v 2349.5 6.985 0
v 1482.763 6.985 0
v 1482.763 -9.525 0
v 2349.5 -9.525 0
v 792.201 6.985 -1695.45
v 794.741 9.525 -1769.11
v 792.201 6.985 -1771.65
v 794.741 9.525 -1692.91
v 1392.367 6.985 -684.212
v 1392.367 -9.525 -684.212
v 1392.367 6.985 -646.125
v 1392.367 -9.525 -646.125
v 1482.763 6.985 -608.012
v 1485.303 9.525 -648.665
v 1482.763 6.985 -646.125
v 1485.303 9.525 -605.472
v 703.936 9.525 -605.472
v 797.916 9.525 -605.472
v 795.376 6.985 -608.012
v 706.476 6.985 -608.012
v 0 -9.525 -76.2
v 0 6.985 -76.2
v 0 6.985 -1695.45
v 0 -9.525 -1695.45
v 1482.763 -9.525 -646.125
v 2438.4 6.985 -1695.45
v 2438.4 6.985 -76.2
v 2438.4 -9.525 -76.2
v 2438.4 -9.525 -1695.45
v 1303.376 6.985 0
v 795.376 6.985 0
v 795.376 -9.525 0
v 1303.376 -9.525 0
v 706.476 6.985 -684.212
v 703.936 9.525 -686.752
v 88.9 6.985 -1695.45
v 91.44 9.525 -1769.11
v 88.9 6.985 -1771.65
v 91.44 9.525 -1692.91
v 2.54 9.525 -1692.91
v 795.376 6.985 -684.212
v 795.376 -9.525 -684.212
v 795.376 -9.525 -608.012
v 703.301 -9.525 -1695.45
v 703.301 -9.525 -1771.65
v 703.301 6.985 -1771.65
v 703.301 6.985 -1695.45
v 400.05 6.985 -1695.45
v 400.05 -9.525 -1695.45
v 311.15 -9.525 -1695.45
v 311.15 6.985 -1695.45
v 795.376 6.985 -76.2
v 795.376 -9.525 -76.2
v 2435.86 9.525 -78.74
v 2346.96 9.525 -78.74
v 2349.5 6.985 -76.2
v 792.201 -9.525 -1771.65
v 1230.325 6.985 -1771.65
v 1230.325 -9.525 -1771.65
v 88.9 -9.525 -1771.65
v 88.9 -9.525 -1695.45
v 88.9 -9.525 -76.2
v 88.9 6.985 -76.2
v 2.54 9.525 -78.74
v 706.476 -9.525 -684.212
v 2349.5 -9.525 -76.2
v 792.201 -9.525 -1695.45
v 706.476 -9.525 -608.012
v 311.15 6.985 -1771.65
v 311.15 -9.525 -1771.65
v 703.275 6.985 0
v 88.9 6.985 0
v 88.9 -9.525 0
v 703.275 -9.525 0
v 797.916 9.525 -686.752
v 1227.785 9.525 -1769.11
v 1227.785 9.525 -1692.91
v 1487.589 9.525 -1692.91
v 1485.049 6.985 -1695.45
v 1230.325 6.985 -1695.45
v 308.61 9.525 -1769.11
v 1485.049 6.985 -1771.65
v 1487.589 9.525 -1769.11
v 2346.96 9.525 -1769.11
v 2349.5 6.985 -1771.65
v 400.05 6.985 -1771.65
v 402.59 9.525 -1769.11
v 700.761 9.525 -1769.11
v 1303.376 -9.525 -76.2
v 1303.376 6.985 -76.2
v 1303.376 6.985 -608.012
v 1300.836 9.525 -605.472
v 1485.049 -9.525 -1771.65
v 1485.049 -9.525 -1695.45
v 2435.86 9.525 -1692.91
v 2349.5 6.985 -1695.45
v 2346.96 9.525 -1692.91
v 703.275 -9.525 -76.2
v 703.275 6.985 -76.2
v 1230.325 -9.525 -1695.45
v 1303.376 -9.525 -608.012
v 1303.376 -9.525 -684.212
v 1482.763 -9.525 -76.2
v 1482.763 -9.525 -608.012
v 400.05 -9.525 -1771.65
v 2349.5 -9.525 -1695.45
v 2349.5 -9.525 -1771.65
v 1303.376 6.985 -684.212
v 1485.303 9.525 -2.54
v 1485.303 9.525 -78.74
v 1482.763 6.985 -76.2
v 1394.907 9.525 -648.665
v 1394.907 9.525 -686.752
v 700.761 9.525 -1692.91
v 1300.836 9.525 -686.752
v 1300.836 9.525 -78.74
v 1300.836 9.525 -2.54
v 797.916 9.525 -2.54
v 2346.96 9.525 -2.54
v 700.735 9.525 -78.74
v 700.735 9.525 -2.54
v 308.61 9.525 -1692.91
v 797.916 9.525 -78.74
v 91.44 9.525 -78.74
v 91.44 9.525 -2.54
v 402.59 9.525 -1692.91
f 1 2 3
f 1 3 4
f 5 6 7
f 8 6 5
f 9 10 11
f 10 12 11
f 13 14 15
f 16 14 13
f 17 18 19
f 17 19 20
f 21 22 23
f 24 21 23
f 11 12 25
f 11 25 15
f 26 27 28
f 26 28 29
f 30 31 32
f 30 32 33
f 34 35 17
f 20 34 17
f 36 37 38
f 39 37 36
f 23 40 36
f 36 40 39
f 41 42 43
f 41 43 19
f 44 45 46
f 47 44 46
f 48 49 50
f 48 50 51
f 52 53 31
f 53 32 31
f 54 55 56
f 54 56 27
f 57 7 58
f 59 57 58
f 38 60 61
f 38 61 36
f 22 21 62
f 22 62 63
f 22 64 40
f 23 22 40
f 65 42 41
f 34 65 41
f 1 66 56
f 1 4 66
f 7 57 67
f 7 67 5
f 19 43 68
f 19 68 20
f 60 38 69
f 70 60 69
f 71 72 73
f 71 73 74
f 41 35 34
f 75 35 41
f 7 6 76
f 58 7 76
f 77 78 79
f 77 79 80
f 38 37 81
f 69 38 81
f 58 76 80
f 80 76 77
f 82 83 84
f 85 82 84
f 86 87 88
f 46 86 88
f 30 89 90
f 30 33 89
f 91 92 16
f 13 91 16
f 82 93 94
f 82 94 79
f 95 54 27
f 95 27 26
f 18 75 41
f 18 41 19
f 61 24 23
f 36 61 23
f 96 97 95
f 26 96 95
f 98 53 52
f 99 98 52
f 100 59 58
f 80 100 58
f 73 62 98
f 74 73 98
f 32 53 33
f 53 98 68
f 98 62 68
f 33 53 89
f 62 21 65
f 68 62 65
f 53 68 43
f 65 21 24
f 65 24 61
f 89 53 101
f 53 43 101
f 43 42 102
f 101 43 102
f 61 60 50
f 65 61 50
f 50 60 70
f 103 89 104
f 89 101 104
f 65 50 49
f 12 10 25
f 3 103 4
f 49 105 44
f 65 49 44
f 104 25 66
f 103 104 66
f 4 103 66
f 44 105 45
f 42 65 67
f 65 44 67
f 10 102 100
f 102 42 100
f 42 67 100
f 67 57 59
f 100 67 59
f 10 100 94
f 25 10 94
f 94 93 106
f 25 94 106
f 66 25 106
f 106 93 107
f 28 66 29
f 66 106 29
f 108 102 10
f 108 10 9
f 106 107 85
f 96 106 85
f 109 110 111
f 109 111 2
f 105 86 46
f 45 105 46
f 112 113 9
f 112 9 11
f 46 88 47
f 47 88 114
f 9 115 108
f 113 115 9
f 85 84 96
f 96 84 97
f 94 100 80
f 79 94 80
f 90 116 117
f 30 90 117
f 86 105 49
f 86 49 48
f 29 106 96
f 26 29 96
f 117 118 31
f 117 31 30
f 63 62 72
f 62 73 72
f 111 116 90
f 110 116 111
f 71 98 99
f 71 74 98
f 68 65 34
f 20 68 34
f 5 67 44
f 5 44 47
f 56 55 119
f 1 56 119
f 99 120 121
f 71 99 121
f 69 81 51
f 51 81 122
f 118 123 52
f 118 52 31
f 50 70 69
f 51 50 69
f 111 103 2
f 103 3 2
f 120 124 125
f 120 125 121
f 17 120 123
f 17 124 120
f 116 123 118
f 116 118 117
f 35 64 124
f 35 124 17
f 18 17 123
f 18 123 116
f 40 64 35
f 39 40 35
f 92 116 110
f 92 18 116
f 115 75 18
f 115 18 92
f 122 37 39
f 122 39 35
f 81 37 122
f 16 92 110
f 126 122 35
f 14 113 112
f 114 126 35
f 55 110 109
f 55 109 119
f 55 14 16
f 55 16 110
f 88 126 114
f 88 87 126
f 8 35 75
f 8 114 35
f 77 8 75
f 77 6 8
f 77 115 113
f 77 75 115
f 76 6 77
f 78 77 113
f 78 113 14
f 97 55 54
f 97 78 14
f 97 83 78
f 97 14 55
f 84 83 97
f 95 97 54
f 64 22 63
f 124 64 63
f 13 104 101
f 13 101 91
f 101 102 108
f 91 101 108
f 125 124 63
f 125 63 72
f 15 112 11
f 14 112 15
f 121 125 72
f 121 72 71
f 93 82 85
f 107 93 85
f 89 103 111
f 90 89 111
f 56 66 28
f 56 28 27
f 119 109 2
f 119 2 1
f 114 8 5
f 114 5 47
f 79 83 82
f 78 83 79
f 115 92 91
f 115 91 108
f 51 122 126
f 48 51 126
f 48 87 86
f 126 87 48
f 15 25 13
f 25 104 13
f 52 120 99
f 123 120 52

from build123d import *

# Parameters (mm, degrees)
SKETCH1_W                 = 2438.4
SKETCH1_H                 = 1771.65
BOSS_EXTRUDE1_DEPTH       = 9.525
CUT_EXTRUDE2_START        = 1303.3756
CUT_EXTRUDE2_OUTLINE_W    = 19.05
CUT_EXTRUDE2_OUTLINE_H    = 76.2
CUT_EXTRUDE2_OUTLINE_H_2  = 38.1127
CUT_EXTRUDE2_DEPTH        = 179.3875
CUT_EXTRUDE2_START_2      = 706.4756
CUT_EXTRUDE2_2_OUTLINE_W  = 19.05
CUT_EXTRUDE2_2_OUTLINE_H  = 76.2
CUT_EXTRUDE2_2_DEPTH      = 85.725
CUT_EXTRUDE2_3_OUTLINE_W  = 19.05
CUT_EXTRUDE2_3_OUTLINE_H  = 76.2
CUT_EXTRUDE2_3_DEPTH      = 88.9
CUT_EXTRUDE2_START_3      = 2349.5
CUT_EXTRUDE2_4_OUTLINE_W  = 19.05
CUT_EXTRUDE2_4_OUTLINE_H  = 76.2
CUT_EXTRUDE2_4_DEPTH      = 88.9
CUT_EXTRUDE2_START_4      = 311.15
CUT_EXTRUDE2_5_OUTLINE_W  = 19.05
CUT_EXTRUDE2_5_OUTLINE_H  = 76.2
CUT_EXTRUDE2_5_DEPTH      = 88.9
CUT_EXTRUDE2_START_5      = 1230.3252
CUT_EXTRUDE2_6_OUTLINE_W  = 19.05
CUT_EXTRUDE2_6_OUTLINE_H  = 76.2
CUT_EXTRUDE2_6_DEPTH      = 254.7239
CUT_EXTRUDE2_7_OUTLINE_W  = 19.05
CUT_EXTRUDE2_7_OUTLINE_H  = 38.0873
CUT_EXTRUDE2_7_DEPTH      = 88.991565563
CUT_EXTRUDE2_START_6      = 703.2752
CUT_EXTRUDE2_8_OUTLINE_W  = 19.05
CUT_EXTRUDE2_8_OUTLINE_H  = 76.2
CUT_EXTRUDE2_8_DEPTH      = 92.1004
CUT_EXTRUDE2_START_7      = 703.3006
CUT_EXTRUDE2_9_OUTLINE_W  = 19.05
CUT_EXTRUDE2_9_OUTLINE_H  = 76.2
CUT_EXTRUDE2_9_DEPTH      = 3.175
CUT_EXTRUDE2_START_8      = 792.2006
CUT_EXTRUDE2_10_OUTLINE_W = 19.05
CUT_EXTRUDE2_10_OUTLINE_H = 76.2
CUT_EXTRUDE2_10_DEPTH     = 3.175
CHAMFER1_SIZE             = 2.54


# Read off the part's stored shape, not the designer's step: Cut-Extrude2
with BuildPart() as part:
    # Sketch1 → Boss-Extrude1 (new, symmetric)
    with BuildSketch(Plane(origin=(0, 0, 0), x_dir=(1, 0, 0), z_dir=(0, 1, 0))):
        with Locations((1219.2, 885.825)):
            Rectangle(SKETCH1_W, SKETCH1_H)
    extrude(amount=BOSS_EXTRUDE1_DEPTH, both=True)

    # Cut-Extrude2 outline → Cut-Extrude2 (cut)
    with BuildSketch(Plane.YZ.offset(CUT_EXTRUDE2_START)):
        with Locations((0, -1733.55)):
            Rectangle(CUT_EXTRUDE2_OUTLINE_W, CUT_EXTRUDE2_OUTLINE_H)
        with Locations((0, -627.068849999)):
            Rectangle(CUT_EXTRUDE2_OUTLINE_W, CUT_EXTRUDE2_OUTLINE_H_2)
        with Locations((0, -38.1)):
            Rectangle(CUT_EXTRUDE2_OUTLINE_W, CUT_EXTRUDE2_OUTLINE_H)
    extrude(amount=CUT_EXTRUDE2_DEPTH, mode=Mode.SUBTRACT)

    # Cut-Extrude2 2 outline → Cut-Extrude2 2 (cut)
    with BuildSketch(Plane.YZ.offset(CUT_EXTRUDE2_START_2)):
        with Locations((0, -1733.55)):
            Rectangle(CUT_EXTRUDE2_2_OUTLINE_W, CUT_EXTRUDE2_2_OUTLINE_H)
        with Locations((0, -646.112499999)):
            Rectangle(CUT_EXTRUDE2_2_OUTLINE_W, CUT_EXTRUDE2_2_OUTLINE_H)
        with Locations((0, -38.1)):
            Rectangle(CUT_EXTRUDE2_2_OUTLINE_W, CUT_EXTRUDE2_2_OUTLINE_H)
    extrude(amount=CUT_EXTRUDE2_2_DEPTH, mode=Mode.SUBTRACT)

    # Cut-Extrude2 3 outline → Cut-Extrude2 3 (cut)
    with BuildSketch(Plane.YZ):
        with Locations((0, -1733.55)):
            Rectangle(CUT_EXTRUDE2_3_OUTLINE_W, CUT_EXTRUDE2_3_OUTLINE_H)
        with Locations((0, -38.1)):
            Rectangle(CUT_EXTRUDE2_3_OUTLINE_W, CUT_EXTRUDE2_3_OUTLINE_H)
    extrude(amount=CUT_EXTRUDE2_3_DEPTH, mode=Mode.SUBTRACT)

    # Cut-Extrude2 4 outline → Cut-Extrude2 4 (cut)
    with BuildSketch(Plane.YZ.offset(CUT_EXTRUDE2_START_3)):
        with Locations((0, -1733.55)):
            Rectangle(CUT_EXTRUDE2_4_OUTLINE_W, CUT_EXTRUDE2_4_OUTLINE_H)
        with Locations((0, -38.1)):
            Rectangle(CUT_EXTRUDE2_4_OUTLINE_W, CUT_EXTRUDE2_4_OUTLINE_H)
    extrude(amount=CUT_EXTRUDE2_4_DEPTH, mode=Mode.SUBTRACT)

    # Cut-Extrude2 5 outline → Cut-Extrude2 5 (cut)
    with BuildSketch(Plane.YZ.offset(CUT_EXTRUDE2_START_4)):
        with Locations((0, -1733.55)):
            Rectangle(CUT_EXTRUDE2_5_OUTLINE_W, CUT_EXTRUDE2_5_OUTLINE_H)
    extrude(amount=CUT_EXTRUDE2_5_DEPTH, mode=Mode.SUBTRACT)

    # Cut-Extrude2 6 outline → Cut-Extrude2 6 (cut)
    with BuildSketch(Plane.YZ.offset(CUT_EXTRUDE2_START_5)):
        with Locations((0, -1733.55)):
            Rectangle(CUT_EXTRUDE2_6_OUTLINE_W, CUT_EXTRUDE2_6_OUTLINE_H)
    extrude(amount=CUT_EXTRUDE2_6_DEPTH, mode=Mode.SUBTRACT)

    # Cut-Extrude2 7 outline → Cut-Extrude2 7 (cut)
    with BuildSketch(Plane.YZ.offset(CUT_EXTRUDE2_START)):
        with Locations((0, -665.168849999)):
            Rectangle(CUT_EXTRUDE2_7_OUTLINE_W, CUT_EXTRUDE2_7_OUTLINE_H)
    extrude(amount=CUT_EXTRUDE2_7_DEPTH, mode=Mode.SUBTRACT)

    # Cut-Extrude2 8 outline → Cut-Extrude2 8 (cut)
    with BuildSketch(Plane.YZ.offset(CUT_EXTRUDE2_START_6)):
        with Locations((0, -38.1)):
            Rectangle(CUT_EXTRUDE2_8_OUTLINE_W, CUT_EXTRUDE2_8_OUTLINE_H)
    extrude(amount=CUT_EXTRUDE2_8_DEPTH, mode=Mode.SUBTRACT)

    # Cut-Extrude2 9 outline → Cut-Extrude2 9 (cut)
    with BuildSketch(Plane.YZ.offset(CUT_EXTRUDE2_START_7)):
        with Locations((0, -1733.55)):
            Rectangle(CUT_EXTRUDE2_9_OUTLINE_W, CUT_EXTRUDE2_9_OUTLINE_H)
    extrude(amount=CUT_EXTRUDE2_9_DEPTH, mode=Mode.SUBTRACT)

    # Cut-Extrude2 10 outline → Cut-Extrude2 10 (cut)
    with BuildSketch(Plane.YZ.offset(CUT_EXTRUDE2_START_8)):
        with Locations((0, -646.112499999)):
            Rectangle(CUT_EXTRUDE2_10_OUTLINE_W, CUT_EXTRUDE2_10_OUTLINE_H)
    extrude(amount=CUT_EXTRUDE2_10_DEPTH, mode=Mode.SUBTRACT)

    # Chamfer1
    chamfer1_edges = [part.edges().sort_by_distance(p)[0] for p in [
        (1303.3756, 9.525, -646.112499999),
        (1393.06935, 9.525, -608.012499999),
        (1482.7631, 9.525, -627.068849999),
        (1437.565132782, 9.525, -646.125199999),
        (1392.367165563, 9.525, -665.168849999),
        (1347.871382781, 9.525, -684.212499999),
        (88.9, 9.525, -38.1),
        (44.45, 9.525, -76.2),
        (795.3756, 9.525, -38.1),
        (749.3254, 9.525, -76.2),
        (703.2752, 9.525, -38.1),
        (1482.7631, 9.525, -38.1),
        (1393.06935, 9.525, -76.2),
        (1303.3756, 9.525, -38.1),
        (2393.95, 9.525, -76.2),
        (2349.5, 9.525, -38.1),
        (44.45, 9.525, -1695.45),
        (88.9, 9.525, -1733.55),
        (0, 9.525, -885.825),
        (396.0876, 9.525, 0),
        (1049.3756, 9.525, 0),
        (1916.13155, 9.525, 0),
        (2438.4, 9.525, -885.825),
        (1917.27455, 9.525, -1771.65),
        (1011.2629, 9.525, -1771.65),
        (551.6753, 9.525, -1771.65),
        (200.025, 9.525, -1771.65),
        (311.15, 9.525, -1733.55),
        (355.6, 9.525, -1695.45),
        (400.05, 9.525, -1733.55),
        (703.3006, 9.525, -1733.55),
        (747.7506, 9.525, -1695.45),
        (792.2006, 9.525, -1733.55),
        (1230.3252, 9.525, -1733.55),
        (1357.68715, 9.525, -1695.45),
        (1485.0491, 9.525, -1733.55),
        (2349.5, 9.525, -1733.55),
        (2393.95, 9.525, -1695.45),
        (706.4756, 9.525, -646.112499999),
        (750.9256, 9.525, -608.012499999),
        (795.3756, 9.525, -646.112499999),
        (750.9256, 9.525, -684.212499999),
    ]]
    chamfer(chamfer1_edges, length=CHAMFER1_SIZE)


solid = part.part
